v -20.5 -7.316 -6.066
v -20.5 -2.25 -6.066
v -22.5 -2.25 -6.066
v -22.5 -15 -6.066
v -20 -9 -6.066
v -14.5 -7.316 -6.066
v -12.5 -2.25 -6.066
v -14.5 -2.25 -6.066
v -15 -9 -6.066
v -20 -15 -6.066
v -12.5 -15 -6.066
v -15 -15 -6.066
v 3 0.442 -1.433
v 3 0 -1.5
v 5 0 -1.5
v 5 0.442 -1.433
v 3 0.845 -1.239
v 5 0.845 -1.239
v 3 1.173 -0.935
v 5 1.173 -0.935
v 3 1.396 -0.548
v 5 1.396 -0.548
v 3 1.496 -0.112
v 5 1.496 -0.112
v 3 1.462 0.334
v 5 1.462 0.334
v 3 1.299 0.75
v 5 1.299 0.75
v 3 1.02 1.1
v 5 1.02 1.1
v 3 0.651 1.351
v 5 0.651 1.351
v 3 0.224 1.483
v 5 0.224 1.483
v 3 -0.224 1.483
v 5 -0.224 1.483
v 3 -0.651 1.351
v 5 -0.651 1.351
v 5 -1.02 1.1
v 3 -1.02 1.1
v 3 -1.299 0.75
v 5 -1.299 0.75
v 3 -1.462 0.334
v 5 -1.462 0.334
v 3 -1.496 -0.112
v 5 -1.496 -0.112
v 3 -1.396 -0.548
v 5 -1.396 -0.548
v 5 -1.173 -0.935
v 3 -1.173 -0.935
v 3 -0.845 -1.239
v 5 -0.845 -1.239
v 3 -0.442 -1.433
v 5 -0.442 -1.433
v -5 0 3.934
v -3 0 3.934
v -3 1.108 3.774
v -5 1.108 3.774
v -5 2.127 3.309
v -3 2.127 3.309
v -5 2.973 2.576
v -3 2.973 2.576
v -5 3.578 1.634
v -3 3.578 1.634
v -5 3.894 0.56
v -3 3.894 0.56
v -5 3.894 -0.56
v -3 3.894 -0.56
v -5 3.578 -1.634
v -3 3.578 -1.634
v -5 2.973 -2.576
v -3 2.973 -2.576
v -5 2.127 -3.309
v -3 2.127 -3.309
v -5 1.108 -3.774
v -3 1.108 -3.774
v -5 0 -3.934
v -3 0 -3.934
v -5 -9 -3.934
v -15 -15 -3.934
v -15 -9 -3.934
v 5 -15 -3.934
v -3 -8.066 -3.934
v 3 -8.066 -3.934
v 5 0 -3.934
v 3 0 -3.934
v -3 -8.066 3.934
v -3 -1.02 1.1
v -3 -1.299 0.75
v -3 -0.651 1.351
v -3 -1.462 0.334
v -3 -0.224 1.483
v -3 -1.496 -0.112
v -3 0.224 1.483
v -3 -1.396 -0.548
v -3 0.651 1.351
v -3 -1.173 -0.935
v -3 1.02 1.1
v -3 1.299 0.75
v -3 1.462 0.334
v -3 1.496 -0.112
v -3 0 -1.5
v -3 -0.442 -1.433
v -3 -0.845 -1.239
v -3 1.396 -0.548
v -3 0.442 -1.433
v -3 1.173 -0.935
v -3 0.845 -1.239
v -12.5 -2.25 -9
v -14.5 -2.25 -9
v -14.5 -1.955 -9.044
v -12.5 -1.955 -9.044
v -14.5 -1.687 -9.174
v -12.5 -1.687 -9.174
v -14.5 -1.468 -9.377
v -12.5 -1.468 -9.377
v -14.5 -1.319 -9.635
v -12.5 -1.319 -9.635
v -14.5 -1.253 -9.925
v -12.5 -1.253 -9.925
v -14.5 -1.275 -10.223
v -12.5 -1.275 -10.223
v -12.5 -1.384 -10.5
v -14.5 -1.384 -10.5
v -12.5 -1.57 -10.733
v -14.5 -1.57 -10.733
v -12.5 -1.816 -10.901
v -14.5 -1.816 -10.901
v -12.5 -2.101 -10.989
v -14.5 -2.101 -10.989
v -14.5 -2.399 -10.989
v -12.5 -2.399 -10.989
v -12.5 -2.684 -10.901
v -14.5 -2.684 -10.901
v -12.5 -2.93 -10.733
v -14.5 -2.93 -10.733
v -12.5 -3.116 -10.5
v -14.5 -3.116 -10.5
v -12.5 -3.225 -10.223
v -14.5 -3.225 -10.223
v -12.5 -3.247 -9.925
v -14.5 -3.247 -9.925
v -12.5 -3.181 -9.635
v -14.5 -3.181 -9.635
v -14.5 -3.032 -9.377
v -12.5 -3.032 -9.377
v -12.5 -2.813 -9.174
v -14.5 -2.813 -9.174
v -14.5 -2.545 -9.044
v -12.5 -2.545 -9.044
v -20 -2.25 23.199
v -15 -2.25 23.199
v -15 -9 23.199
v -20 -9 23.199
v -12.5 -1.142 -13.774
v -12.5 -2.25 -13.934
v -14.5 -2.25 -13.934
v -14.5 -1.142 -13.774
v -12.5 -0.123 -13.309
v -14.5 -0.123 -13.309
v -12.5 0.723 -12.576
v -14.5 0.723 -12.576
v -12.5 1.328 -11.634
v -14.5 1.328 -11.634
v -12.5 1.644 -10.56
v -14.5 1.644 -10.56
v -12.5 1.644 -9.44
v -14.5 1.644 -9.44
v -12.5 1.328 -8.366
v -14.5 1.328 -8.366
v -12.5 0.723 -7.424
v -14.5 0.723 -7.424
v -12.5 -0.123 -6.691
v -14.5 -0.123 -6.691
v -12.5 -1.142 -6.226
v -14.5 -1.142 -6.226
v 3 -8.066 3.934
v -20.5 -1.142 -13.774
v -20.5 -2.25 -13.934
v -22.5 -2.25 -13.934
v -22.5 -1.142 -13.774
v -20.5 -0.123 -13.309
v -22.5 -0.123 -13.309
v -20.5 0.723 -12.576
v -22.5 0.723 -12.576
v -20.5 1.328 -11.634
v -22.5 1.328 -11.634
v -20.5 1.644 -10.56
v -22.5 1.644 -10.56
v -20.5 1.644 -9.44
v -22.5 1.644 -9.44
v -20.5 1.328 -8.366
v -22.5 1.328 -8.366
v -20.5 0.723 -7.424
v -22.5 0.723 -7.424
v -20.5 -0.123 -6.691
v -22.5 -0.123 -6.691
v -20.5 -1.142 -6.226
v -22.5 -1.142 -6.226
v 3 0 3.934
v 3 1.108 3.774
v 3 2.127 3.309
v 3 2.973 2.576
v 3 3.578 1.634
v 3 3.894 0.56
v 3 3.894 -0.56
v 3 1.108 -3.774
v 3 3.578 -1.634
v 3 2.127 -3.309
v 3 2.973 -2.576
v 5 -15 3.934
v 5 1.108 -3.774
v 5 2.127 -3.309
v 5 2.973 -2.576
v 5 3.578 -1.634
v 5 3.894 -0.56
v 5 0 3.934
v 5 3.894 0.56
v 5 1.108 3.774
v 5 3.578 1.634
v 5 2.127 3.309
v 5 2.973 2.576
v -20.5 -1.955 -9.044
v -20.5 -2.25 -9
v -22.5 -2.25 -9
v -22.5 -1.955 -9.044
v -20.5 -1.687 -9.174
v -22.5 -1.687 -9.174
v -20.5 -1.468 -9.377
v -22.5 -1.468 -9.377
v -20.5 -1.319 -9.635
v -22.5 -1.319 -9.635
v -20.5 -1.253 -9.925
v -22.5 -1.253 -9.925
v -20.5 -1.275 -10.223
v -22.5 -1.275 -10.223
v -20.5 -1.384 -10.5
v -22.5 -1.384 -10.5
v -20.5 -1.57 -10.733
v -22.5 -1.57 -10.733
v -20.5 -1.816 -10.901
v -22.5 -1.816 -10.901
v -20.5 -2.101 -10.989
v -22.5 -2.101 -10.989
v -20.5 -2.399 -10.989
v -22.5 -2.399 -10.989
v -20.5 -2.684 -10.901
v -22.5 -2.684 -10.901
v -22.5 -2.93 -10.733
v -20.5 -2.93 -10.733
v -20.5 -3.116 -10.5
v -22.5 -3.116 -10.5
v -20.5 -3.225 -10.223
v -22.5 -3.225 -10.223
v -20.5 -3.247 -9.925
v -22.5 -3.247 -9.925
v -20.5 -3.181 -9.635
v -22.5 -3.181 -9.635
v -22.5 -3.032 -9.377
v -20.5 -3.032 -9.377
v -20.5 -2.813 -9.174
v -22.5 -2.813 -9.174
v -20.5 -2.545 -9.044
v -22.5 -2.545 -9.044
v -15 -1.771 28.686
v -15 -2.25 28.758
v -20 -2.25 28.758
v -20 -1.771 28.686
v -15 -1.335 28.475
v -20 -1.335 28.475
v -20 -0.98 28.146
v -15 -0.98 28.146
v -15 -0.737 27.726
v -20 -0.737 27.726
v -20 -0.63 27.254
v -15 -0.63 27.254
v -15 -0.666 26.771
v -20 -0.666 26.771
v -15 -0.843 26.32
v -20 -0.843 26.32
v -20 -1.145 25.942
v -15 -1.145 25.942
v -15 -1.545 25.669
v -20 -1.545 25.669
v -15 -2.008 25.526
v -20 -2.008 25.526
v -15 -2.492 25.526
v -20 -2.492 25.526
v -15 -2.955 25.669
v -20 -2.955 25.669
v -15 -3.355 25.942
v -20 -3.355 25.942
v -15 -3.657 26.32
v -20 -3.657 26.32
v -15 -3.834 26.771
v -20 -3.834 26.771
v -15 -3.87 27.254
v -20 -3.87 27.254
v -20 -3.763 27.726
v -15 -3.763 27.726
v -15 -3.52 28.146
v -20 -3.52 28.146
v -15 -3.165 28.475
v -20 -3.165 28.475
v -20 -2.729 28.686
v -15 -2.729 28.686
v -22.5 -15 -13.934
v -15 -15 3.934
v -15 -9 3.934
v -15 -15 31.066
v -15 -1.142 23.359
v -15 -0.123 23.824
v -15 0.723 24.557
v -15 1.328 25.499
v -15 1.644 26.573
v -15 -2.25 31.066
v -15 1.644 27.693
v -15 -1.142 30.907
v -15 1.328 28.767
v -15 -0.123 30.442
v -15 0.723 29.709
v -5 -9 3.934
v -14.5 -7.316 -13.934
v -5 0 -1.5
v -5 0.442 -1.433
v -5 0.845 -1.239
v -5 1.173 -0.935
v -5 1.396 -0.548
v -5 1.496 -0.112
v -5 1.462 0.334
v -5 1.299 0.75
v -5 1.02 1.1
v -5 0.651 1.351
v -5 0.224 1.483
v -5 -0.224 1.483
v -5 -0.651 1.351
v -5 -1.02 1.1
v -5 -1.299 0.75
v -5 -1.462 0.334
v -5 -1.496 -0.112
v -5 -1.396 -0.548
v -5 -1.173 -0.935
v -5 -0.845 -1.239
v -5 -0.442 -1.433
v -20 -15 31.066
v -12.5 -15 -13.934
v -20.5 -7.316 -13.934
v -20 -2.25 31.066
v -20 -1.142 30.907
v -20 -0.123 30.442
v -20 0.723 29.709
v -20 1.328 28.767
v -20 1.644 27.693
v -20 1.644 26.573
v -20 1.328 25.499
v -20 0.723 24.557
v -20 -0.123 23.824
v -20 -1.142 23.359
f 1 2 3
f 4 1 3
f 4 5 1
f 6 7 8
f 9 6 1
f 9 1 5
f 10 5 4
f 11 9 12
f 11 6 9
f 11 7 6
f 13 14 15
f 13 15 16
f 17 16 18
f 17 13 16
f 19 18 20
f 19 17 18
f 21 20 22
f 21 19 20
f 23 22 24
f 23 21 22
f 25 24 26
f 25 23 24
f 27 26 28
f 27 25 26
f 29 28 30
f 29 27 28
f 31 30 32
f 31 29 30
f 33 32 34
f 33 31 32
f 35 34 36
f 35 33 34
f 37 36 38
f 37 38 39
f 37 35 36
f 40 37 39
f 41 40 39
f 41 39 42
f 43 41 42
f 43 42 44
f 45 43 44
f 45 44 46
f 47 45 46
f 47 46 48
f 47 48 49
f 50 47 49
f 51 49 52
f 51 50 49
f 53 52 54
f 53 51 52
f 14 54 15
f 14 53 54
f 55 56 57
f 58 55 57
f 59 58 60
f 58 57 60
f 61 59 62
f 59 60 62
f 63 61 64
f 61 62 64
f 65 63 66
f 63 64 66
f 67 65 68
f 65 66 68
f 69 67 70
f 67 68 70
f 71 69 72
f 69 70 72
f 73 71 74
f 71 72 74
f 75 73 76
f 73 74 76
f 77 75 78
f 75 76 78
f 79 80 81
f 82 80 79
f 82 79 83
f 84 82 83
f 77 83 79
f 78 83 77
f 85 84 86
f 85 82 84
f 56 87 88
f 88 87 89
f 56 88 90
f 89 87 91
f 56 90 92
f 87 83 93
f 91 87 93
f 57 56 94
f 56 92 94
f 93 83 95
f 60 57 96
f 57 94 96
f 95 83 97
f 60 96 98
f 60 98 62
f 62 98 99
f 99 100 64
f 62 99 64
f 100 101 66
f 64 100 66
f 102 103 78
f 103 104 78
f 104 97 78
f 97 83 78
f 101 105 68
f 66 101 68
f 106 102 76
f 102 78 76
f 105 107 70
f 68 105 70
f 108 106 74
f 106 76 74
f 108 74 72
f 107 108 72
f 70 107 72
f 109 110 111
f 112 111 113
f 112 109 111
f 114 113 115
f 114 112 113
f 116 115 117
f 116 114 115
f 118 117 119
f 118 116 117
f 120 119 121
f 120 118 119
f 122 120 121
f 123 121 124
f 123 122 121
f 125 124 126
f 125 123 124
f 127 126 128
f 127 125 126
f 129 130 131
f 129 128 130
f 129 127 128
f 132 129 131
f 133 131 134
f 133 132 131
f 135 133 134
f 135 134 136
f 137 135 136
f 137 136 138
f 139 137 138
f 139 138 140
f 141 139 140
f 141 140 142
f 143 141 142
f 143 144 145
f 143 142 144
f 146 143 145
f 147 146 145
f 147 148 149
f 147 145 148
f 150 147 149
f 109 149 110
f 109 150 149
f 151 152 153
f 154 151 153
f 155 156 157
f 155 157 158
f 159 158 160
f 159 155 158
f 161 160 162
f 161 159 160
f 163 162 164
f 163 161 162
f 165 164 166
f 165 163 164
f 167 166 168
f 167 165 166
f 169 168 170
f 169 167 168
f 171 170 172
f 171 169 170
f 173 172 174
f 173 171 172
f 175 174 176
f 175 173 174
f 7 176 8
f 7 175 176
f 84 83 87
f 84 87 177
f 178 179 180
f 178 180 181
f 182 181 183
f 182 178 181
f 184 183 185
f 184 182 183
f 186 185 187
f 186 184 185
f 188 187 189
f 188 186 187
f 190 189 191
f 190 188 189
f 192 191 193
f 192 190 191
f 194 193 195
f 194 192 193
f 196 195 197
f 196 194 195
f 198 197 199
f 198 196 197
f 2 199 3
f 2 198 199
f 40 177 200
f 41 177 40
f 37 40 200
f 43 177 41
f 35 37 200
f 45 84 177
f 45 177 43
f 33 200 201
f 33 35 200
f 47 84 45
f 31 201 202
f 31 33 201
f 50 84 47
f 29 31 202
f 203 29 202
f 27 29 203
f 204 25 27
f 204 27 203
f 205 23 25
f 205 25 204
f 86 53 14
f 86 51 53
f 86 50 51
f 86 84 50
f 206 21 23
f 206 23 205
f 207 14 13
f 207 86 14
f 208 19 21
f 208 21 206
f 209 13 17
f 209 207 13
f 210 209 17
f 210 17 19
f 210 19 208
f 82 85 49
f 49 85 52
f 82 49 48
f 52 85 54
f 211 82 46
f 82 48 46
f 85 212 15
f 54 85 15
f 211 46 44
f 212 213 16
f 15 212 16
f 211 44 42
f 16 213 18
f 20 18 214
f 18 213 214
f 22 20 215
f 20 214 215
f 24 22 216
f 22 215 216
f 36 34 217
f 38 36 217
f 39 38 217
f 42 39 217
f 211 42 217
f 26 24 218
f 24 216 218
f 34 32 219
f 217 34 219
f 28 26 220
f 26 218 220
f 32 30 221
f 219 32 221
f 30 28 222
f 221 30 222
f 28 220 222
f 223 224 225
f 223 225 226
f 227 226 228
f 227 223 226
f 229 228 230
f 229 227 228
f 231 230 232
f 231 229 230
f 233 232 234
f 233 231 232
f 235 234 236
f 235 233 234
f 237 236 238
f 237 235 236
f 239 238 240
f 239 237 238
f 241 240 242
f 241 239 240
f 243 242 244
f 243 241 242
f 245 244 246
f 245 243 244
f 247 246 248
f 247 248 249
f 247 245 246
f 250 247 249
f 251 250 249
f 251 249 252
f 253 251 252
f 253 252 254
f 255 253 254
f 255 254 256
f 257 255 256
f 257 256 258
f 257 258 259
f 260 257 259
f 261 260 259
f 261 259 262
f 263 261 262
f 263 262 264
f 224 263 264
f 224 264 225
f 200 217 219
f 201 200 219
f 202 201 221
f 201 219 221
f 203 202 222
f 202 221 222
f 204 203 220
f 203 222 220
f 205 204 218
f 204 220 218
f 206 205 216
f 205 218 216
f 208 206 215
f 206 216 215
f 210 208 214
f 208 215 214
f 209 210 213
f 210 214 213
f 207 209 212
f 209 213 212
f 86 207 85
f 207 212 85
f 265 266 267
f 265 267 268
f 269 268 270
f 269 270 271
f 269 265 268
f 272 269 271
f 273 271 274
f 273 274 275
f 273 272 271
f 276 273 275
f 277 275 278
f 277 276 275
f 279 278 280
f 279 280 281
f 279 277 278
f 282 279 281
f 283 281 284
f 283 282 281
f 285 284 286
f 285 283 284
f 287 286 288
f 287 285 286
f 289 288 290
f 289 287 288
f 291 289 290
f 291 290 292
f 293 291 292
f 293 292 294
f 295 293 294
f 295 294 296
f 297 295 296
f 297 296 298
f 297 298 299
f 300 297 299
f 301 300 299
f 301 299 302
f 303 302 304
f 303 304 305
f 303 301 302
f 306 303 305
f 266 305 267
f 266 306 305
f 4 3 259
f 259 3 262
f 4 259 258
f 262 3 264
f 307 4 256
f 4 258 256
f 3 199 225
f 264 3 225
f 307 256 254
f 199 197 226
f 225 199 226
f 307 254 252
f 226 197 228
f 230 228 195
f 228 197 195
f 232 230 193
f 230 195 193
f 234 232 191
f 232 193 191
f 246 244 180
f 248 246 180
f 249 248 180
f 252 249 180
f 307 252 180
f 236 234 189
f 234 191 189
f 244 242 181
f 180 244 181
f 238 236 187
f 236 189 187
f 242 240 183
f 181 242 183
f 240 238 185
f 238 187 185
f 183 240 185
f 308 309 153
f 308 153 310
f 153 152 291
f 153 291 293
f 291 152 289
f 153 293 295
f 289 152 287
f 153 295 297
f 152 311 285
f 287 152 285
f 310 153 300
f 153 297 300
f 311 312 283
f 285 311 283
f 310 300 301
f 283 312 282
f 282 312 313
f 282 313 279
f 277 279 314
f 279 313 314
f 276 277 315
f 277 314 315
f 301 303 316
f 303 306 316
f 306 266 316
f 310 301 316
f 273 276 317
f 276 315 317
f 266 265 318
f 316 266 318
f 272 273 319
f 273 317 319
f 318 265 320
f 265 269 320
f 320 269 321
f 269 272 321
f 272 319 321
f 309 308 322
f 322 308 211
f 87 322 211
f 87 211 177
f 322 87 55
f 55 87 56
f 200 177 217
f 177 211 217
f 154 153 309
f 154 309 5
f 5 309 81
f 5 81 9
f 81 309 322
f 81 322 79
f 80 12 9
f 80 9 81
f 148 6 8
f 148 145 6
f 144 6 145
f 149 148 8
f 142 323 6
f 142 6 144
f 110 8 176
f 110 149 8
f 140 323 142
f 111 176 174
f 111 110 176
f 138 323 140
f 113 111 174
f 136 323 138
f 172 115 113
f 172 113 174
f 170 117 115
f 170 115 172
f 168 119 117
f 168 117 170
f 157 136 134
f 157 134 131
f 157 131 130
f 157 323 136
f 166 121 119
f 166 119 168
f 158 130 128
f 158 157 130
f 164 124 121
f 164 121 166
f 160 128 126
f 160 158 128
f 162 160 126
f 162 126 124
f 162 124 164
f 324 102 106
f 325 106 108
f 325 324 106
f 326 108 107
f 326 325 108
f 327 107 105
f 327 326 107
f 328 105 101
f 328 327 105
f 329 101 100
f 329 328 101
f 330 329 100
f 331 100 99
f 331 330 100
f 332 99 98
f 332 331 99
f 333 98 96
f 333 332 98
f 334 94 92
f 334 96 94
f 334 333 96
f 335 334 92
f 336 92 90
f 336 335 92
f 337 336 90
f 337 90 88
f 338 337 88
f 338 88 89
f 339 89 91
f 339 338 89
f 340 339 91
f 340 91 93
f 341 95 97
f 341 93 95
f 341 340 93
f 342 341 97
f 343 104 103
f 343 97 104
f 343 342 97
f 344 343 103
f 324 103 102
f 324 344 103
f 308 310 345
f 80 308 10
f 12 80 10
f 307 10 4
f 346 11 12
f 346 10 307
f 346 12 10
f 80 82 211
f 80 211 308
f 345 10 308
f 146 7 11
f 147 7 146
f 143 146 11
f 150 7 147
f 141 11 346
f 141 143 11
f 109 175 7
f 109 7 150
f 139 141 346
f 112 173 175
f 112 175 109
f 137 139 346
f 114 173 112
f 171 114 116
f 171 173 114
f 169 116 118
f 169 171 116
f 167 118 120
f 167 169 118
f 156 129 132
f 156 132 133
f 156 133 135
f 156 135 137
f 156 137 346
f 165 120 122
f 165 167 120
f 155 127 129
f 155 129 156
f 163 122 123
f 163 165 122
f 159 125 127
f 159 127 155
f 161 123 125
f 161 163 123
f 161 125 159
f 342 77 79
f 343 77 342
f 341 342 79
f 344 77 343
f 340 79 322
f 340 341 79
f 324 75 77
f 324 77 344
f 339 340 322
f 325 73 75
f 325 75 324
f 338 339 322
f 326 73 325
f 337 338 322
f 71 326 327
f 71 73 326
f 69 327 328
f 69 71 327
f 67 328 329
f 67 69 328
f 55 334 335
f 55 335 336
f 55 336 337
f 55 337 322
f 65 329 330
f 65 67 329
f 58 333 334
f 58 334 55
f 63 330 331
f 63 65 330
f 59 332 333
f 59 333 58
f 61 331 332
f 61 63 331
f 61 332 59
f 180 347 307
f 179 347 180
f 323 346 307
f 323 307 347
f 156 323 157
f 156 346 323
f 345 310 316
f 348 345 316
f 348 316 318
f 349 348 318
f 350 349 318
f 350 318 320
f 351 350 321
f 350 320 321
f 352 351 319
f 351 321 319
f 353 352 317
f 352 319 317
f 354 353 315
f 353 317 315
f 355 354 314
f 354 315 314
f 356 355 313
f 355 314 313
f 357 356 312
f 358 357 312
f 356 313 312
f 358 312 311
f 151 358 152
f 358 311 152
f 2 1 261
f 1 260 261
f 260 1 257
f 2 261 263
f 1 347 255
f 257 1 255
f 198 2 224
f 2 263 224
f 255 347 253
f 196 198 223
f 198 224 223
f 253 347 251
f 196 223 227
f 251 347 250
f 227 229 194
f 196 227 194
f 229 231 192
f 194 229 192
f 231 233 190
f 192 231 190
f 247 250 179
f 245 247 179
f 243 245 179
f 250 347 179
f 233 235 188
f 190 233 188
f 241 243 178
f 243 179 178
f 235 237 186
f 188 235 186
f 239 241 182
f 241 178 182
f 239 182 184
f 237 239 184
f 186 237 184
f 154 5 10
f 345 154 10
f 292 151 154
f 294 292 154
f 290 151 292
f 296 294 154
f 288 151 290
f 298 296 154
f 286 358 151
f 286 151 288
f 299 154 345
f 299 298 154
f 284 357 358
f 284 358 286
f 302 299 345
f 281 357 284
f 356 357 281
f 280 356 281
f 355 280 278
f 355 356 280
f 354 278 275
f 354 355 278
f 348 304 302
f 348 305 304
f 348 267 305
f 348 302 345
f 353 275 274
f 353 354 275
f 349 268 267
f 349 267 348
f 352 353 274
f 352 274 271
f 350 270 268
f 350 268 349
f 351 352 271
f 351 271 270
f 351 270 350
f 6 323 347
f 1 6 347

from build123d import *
from build123d.topology import SkipClean

# Parameters (mm, degrees)
SKETCH1_R                      = 1.5
BOSS_EXTRUDE1_DEPTH            = 5
CUT_EXTRUDE1_DEPTH             = 17.293347298
CUT_EXTRUDE1_DEPTH_BACK        = 17.293347298
SKETCH2_W                      = 6
SKETCH2_H                      = 12
SKETCH5_W                      = 7.867189124
SKETCH5_H                      = 6
BOSS_EXTRUDE2_DEPTH            = 10
SKETCH6_R                      = 1
SKETCH6_R_2                    = 1.625
BOSS_EXTRUDE3_DEPTH            = 5
BOSS_EXTRUDE4_DEPTH            = 2.5
BOSS_EXTRUDE4_DEPTH_BACK       = 7.5
SKETCH7_R                      = 1
CUT_EXTRUDE2_REACH             = 54.5
SKETCH8_W                      = 6
SKETCH8_H                      = 9
CUT_EXTRUDE2_DIRECTION_2_DEPTH = 53.5


with BuildPart() as part:
    # Sketch1 → Boss-Extrude1 (new, symmetric)
    with BuildSketch(Plane(origin=(0, 0, 0), x_dir=(0, 0, -1), z_dir=(1, 0, 0))):
        with BuildLine():
            Line((3.933594562, 0), (3.933594562, -15))
            Line((3.933594562, -15), (-3.933594562, -15))
            Line((-3.933594562, -15), (-3.933594562, 0))
            ThreePointArc((-3.933594562, 0), (0, 3.933594562), (3.933594562, 0))
        make_face()
        Circle(SKETCH1_R, mode=Mode.SUBTRACT)
    extrude(amount=BOSS_EXTRUDE1_DEPTH, both=True)

    # Sketch2 → Cut-Extrude1 (cut, two sides: drawn at the far end of the back side and taken through both)
    with BuildSketch(Plane.XY.offset(-CUT_EXTRUDE1_DEPTH_BACK)):
        with Locations((0, -2.066405438)):
            Rectangle(SKETCH2_W, SKETCH2_H)
    extrude(amount=CUT_EXTRUDE1_DEPTH + CUT_EXTRUDE1_DEPTH_BACK, mode=Mode.SUBTRACT)

    # Sketch5 → Boss-Extrude2 (add)
    with BuildSketch(Plane.ZY.offset(5)):
        with Locations((0, -12)):
            Rectangle(SKETCH5_W, SKETCH5_H)
    extrude(amount=BOSS_EXTRUDE2_DEPTH)

    # Sketch6 → Boss-Extrude3 (add)
    with BuildSketch(Plane.ZY.offset(15)):
        with BuildLine():
            Line((23.199216315, -9), (-6.066405438, -9))
            Line((-6.066405438, -9), (-6.066405438, -2.25))
            ThreePointArc((-6.066405438, -2.25), (-10, 1.683594562), (-13.933594562, -2.25))
            Line((-13.933594562, -2.25), (-13.933594562, -6.757725184))
            Line((-13.933594562, -6.757725184), (-13.933594562, -15))
            Line((-13.933594562, -15), (31.066405438, -15))
            Line((31.066405438, -15), (31.066405438, -6.757725184))
            Line((31.066405438, -6.757725184), (31.066405438, -2.25))
            ThreePointArc((31.066405438, -2.25), (27.132810876, 1.683594562), (23.199216315, -2.25))
            Line((23.199216315, -2.25), (23.199216315, -9))
        make_face()
        with Locations((-10, -2.25)):
            Circle(SKETCH6_R, mode=Mode.SUBTRACT)
        with Locations((27.132810876, -2.25)):
            Circle(SKETCH6_R_2, mode=Mode.SUBTRACT)
    extrude(amount=BOSS_EXTRUDE3_DEPTH)

    # Sketch7 → Boss-Extrude4 (add, two sides: drawn at the far end of the back side and taken through both)
    with SkipClean():  # the faces are left unmerged after this step: merging them gives an invalid solid
        with BuildSketch(Plane.ZY.offset(20).offset(-BOSS_EXTRUDE4_DEPTH_BACK)):
            with BuildLine():
                Line((-13.933594562, -15), (-13.933594562, -2.25))
                ThreePointArc((-13.933594562, -2.25), (-10, 1.683594562), (-6.066405438, -2.25))
                Line((-6.066405438, -2.25), (-6.066405438, -15))
                Line((-6.066405438, -15), (-13.933594562, -15))
            make_face()
            with Locations((-10, -2.25)):
                Circle(SKETCH7_R, mode=Mode.SUBTRACT)
        extrude(amount=BOSS_EXTRUDE4_DEPTH + BOSS_EXTRUDE4_DEPTH_BACK)
    add(part.part.scale(1), mode=Mode.REPLACE)  # the faces are merged on a copy

    # Sketch8 → Cut-Extrude2 (cut, up to next)
    with BuildSketch(Plane(origin=(0, 0, -13.933594562), x_dir=(-1, 0, 0), z_dir=(0, 0, -1)), mode=Mode.PRIVATE) as cut_extrude2_sk1:
        with Locations((17.5, -2.816405438)):
            Rectangle(SKETCH8_W, SKETCH8_H)
    cut_extrude2_tool1 = extrude(cut_extrude2_sk1.sketch, amount=-CUT_EXTRUDE2_REACH, mode=Mode.PRIVATE) & part.part
    add(cut_extrude2_tool1.solids().sort_by_distance((-17.5, -2.816405, -13.933595))[0], mode=Mode.SUBTRACT)

    # Sketch8 → Cut-Extrude2 direction 2 (cut)
    with BuildSketch(Plane(origin=(0, 0, -13.933594562), x_dir=(-1, 0, 0), z_dir=(0, 0, -1))):
        with Locations((17.5, -2.816405438)):
            Rectangle(SKETCH8_W, SKETCH8_H)
    extrude(amount=CUT_EXTRUDE2_DIRECTION_2_DEPTH, mode=Mode.SUBTRACT)


solid = part.part
